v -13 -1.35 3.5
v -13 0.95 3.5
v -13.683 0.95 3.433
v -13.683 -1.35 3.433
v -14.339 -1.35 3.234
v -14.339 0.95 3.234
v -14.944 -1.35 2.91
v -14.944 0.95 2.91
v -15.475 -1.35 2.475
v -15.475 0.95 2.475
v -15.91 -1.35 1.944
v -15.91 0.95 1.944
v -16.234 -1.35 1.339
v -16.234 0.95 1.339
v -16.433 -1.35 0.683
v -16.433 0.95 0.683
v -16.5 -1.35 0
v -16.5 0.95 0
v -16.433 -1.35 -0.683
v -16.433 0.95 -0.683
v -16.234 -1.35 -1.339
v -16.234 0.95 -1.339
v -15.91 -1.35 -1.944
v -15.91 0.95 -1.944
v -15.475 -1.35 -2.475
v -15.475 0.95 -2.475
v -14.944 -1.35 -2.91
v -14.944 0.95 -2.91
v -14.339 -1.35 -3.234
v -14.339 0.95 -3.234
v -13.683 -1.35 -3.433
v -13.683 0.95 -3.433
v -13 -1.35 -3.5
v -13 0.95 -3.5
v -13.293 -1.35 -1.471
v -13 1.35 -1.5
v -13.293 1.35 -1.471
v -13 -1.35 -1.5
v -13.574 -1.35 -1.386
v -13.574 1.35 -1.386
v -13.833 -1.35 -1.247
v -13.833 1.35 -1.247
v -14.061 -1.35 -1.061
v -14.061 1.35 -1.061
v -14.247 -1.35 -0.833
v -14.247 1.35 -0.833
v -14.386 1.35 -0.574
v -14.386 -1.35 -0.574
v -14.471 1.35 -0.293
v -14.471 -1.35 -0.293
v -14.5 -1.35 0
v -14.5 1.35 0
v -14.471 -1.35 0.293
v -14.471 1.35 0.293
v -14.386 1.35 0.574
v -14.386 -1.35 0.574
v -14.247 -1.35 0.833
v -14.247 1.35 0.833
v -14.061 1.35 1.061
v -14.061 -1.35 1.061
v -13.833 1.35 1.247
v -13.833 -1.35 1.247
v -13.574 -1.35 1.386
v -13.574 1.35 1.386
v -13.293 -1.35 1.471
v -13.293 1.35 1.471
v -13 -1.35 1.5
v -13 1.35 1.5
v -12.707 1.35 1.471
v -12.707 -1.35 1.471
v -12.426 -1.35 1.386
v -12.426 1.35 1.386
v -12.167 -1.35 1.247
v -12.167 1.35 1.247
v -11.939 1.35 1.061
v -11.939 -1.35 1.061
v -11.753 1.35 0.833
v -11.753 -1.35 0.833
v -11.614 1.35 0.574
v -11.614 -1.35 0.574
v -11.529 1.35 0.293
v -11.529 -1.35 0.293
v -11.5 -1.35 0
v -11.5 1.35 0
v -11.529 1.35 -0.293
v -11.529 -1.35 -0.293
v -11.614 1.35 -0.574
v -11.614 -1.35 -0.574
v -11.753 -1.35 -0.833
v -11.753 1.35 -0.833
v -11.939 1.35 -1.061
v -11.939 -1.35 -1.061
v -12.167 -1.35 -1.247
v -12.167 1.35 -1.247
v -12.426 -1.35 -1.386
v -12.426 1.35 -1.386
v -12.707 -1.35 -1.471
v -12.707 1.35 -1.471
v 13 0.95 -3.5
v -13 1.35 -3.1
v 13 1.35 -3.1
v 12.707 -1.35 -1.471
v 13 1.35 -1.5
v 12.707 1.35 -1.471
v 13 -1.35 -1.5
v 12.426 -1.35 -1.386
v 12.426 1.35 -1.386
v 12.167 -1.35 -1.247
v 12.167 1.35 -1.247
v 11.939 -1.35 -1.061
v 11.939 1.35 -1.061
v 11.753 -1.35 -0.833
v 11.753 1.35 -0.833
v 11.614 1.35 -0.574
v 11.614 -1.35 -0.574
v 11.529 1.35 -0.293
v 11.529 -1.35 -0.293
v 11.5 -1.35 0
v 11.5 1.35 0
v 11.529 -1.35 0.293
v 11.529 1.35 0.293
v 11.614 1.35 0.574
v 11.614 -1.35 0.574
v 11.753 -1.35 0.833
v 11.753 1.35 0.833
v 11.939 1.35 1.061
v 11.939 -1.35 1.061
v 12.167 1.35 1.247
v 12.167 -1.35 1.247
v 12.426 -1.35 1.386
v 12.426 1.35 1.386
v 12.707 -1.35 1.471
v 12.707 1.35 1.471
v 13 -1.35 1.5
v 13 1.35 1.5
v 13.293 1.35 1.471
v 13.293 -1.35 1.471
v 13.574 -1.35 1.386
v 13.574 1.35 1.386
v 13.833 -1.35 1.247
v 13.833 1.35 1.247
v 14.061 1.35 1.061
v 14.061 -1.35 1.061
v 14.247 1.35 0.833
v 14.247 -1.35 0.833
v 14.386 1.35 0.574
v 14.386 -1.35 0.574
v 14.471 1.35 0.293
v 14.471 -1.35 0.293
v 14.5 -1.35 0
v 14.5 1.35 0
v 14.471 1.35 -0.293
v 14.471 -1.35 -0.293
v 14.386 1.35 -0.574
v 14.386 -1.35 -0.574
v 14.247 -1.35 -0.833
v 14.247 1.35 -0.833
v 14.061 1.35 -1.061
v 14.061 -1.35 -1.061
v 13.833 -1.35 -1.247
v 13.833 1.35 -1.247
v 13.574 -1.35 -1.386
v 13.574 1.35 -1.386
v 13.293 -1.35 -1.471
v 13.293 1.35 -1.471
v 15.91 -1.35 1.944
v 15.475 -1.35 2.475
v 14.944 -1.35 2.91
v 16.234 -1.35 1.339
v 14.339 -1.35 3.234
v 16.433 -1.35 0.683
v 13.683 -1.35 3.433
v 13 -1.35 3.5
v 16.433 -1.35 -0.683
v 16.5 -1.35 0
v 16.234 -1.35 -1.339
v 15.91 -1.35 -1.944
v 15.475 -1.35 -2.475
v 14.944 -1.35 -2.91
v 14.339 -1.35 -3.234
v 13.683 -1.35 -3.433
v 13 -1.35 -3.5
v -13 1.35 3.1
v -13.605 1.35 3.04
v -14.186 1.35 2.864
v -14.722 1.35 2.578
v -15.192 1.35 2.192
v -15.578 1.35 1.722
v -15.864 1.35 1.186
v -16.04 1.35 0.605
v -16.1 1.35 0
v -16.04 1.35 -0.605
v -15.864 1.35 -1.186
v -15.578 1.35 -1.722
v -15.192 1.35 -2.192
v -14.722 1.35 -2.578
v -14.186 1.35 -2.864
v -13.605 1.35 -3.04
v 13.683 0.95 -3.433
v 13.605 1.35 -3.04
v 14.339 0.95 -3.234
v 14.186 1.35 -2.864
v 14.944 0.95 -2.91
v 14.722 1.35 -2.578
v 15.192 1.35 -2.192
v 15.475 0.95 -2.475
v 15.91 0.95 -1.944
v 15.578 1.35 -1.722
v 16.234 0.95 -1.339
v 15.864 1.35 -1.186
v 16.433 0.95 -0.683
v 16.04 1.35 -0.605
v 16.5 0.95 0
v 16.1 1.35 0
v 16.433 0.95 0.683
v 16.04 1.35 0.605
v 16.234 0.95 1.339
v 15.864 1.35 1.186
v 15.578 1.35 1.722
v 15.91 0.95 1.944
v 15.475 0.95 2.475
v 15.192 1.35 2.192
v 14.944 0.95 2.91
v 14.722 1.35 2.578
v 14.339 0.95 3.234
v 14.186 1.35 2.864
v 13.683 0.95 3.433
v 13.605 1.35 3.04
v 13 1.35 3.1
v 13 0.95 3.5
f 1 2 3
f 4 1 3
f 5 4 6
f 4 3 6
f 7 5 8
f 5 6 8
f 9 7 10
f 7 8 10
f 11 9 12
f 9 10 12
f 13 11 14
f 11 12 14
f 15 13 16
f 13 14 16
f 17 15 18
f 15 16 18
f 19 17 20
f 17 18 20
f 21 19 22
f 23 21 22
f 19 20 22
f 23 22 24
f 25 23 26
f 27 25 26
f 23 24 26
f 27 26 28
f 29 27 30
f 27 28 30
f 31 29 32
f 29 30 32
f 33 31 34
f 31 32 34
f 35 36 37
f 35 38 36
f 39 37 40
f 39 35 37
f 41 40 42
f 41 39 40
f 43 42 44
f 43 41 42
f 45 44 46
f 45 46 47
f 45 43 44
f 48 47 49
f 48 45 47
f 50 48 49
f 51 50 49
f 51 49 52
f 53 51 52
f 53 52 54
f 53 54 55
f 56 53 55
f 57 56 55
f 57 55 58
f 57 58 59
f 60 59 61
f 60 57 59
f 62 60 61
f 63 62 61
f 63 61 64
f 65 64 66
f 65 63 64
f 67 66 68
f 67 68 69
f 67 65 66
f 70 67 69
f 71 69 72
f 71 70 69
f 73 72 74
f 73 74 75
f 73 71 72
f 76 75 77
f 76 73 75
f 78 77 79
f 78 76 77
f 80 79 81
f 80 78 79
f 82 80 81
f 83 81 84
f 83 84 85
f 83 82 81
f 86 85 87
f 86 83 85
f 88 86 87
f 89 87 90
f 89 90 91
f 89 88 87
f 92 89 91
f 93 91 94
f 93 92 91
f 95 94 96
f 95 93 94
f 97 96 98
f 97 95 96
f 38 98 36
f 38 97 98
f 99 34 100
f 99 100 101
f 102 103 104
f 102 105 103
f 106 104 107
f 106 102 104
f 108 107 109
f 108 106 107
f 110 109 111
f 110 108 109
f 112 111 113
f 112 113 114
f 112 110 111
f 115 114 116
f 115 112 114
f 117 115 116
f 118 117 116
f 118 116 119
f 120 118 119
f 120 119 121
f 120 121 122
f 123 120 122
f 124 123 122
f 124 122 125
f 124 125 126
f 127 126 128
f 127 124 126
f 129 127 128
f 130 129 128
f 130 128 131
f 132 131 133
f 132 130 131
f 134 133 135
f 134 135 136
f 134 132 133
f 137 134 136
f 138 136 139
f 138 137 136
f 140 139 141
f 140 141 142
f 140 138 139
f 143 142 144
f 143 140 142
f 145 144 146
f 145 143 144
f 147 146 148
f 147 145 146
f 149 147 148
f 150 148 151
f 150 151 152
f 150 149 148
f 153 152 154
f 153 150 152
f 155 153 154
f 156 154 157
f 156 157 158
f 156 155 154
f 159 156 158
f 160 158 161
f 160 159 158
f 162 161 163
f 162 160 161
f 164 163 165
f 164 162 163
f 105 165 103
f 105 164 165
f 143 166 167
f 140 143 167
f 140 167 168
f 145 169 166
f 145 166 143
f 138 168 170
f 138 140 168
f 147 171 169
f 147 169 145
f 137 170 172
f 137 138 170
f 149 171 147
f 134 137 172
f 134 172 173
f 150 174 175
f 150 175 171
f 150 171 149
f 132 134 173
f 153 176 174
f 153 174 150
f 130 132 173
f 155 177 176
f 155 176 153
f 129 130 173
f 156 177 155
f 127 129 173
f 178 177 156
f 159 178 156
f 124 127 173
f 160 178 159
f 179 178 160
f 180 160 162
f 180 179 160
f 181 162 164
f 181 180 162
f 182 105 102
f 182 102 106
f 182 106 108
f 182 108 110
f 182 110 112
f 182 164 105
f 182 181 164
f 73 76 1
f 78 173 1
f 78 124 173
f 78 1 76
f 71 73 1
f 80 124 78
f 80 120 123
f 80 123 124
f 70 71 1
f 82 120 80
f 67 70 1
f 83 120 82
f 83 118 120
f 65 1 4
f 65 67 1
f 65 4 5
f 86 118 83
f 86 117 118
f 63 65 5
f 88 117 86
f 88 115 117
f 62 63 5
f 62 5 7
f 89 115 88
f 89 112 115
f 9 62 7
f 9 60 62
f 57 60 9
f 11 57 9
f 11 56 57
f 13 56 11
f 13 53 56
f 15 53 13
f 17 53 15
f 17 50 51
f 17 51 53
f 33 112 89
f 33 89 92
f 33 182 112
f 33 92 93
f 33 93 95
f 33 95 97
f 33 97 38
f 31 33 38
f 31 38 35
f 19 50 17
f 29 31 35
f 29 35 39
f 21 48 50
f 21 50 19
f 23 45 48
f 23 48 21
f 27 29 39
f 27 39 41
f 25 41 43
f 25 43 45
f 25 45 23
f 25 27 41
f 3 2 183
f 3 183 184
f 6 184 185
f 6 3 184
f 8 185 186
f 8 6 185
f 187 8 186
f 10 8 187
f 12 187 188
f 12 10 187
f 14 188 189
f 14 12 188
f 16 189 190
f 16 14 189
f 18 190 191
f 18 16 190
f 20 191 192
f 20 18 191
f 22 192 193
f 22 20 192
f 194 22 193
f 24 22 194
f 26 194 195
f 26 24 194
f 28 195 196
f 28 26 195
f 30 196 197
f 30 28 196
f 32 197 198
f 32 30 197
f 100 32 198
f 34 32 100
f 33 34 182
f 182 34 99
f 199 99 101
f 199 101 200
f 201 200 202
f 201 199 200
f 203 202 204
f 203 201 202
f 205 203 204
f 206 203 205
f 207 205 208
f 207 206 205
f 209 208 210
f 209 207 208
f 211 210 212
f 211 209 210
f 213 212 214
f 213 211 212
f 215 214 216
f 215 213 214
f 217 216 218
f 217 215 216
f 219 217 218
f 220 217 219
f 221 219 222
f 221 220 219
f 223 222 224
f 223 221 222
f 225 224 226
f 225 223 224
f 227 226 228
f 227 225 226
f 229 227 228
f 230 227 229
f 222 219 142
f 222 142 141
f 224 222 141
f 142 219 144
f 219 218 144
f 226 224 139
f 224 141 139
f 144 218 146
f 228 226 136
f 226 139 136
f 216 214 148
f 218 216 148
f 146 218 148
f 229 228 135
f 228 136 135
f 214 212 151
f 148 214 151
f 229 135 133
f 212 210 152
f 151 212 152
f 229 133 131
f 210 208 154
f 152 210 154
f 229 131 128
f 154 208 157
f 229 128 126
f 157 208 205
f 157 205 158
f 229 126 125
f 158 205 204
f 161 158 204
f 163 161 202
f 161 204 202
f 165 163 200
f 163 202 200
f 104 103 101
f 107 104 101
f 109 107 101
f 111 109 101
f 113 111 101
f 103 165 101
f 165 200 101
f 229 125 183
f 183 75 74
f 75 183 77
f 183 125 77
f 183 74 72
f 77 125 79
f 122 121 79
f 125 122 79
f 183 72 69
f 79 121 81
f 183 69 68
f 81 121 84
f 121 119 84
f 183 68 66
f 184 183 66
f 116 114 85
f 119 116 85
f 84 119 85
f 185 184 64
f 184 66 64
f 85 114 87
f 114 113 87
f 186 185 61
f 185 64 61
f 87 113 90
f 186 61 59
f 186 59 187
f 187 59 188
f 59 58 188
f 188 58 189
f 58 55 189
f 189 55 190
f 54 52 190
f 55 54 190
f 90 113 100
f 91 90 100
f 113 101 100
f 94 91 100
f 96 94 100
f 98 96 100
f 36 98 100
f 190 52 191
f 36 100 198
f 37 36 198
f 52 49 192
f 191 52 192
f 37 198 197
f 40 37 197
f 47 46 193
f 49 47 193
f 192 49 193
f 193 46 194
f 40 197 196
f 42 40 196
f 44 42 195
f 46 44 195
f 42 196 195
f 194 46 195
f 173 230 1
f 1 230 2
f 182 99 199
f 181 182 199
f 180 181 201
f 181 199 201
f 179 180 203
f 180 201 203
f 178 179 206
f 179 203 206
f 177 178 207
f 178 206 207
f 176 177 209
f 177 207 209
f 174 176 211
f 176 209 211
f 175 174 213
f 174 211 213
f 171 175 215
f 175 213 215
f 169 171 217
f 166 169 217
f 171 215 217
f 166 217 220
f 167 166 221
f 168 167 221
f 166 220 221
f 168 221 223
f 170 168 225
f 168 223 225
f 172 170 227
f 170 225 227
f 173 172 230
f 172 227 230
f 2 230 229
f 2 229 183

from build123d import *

# Parameters (mm, degrees)
SKETCH1_R           = 1.5
BOSS_EXTRUDE1_DEPTH = 1.35
CHAMFER1_SIZE       = 0.4


with BuildPart() as part:
    # Sketch1 → Boss-Extrude1 (new, symmetric)
    with BuildSketch(Plane(origin=(0, 0, 0), x_dir=(1, 0, 0), z_dir=(0, 1, 0))):
        with BuildLine():
            Line((-13, 3.5), (13, 3.5))
            ThreePointArc((13, 3.5), (16.5, 0), (13, -3.5))
            Line((13, -3.5), (-13, -3.5))
            ThreePointArc((-13, -3.5), (-16.5, 0), (-13, 3.5))
        make_face()
        with Locations(Location((-13, 0, 0), (0, 0, 90))):
            Circle(SKETCH1_R, mode=Mode.SUBTRACT)
        with Locations(Location((13, 0, 0), (0, 0, 90))):
            Circle(SKETCH1_R, mode=Mode.SUBTRACT)
    extrude(amount=BOSS_EXTRUDE1_DEPTH, both=True)

    # Chamfer1
    chamfer1_edges = [part.edges().sort_by_distance(p)[0] for p in [
        (16.5, 1.35, 0),
        (0, 1.35, -3.5),
        (-16.5, 1.35, 0),
        (0, 1.35, 3.5),
    ]]
    chamfer(chamfer1_edges, length=CHAMFER1_SIZE)


solid = part.part
